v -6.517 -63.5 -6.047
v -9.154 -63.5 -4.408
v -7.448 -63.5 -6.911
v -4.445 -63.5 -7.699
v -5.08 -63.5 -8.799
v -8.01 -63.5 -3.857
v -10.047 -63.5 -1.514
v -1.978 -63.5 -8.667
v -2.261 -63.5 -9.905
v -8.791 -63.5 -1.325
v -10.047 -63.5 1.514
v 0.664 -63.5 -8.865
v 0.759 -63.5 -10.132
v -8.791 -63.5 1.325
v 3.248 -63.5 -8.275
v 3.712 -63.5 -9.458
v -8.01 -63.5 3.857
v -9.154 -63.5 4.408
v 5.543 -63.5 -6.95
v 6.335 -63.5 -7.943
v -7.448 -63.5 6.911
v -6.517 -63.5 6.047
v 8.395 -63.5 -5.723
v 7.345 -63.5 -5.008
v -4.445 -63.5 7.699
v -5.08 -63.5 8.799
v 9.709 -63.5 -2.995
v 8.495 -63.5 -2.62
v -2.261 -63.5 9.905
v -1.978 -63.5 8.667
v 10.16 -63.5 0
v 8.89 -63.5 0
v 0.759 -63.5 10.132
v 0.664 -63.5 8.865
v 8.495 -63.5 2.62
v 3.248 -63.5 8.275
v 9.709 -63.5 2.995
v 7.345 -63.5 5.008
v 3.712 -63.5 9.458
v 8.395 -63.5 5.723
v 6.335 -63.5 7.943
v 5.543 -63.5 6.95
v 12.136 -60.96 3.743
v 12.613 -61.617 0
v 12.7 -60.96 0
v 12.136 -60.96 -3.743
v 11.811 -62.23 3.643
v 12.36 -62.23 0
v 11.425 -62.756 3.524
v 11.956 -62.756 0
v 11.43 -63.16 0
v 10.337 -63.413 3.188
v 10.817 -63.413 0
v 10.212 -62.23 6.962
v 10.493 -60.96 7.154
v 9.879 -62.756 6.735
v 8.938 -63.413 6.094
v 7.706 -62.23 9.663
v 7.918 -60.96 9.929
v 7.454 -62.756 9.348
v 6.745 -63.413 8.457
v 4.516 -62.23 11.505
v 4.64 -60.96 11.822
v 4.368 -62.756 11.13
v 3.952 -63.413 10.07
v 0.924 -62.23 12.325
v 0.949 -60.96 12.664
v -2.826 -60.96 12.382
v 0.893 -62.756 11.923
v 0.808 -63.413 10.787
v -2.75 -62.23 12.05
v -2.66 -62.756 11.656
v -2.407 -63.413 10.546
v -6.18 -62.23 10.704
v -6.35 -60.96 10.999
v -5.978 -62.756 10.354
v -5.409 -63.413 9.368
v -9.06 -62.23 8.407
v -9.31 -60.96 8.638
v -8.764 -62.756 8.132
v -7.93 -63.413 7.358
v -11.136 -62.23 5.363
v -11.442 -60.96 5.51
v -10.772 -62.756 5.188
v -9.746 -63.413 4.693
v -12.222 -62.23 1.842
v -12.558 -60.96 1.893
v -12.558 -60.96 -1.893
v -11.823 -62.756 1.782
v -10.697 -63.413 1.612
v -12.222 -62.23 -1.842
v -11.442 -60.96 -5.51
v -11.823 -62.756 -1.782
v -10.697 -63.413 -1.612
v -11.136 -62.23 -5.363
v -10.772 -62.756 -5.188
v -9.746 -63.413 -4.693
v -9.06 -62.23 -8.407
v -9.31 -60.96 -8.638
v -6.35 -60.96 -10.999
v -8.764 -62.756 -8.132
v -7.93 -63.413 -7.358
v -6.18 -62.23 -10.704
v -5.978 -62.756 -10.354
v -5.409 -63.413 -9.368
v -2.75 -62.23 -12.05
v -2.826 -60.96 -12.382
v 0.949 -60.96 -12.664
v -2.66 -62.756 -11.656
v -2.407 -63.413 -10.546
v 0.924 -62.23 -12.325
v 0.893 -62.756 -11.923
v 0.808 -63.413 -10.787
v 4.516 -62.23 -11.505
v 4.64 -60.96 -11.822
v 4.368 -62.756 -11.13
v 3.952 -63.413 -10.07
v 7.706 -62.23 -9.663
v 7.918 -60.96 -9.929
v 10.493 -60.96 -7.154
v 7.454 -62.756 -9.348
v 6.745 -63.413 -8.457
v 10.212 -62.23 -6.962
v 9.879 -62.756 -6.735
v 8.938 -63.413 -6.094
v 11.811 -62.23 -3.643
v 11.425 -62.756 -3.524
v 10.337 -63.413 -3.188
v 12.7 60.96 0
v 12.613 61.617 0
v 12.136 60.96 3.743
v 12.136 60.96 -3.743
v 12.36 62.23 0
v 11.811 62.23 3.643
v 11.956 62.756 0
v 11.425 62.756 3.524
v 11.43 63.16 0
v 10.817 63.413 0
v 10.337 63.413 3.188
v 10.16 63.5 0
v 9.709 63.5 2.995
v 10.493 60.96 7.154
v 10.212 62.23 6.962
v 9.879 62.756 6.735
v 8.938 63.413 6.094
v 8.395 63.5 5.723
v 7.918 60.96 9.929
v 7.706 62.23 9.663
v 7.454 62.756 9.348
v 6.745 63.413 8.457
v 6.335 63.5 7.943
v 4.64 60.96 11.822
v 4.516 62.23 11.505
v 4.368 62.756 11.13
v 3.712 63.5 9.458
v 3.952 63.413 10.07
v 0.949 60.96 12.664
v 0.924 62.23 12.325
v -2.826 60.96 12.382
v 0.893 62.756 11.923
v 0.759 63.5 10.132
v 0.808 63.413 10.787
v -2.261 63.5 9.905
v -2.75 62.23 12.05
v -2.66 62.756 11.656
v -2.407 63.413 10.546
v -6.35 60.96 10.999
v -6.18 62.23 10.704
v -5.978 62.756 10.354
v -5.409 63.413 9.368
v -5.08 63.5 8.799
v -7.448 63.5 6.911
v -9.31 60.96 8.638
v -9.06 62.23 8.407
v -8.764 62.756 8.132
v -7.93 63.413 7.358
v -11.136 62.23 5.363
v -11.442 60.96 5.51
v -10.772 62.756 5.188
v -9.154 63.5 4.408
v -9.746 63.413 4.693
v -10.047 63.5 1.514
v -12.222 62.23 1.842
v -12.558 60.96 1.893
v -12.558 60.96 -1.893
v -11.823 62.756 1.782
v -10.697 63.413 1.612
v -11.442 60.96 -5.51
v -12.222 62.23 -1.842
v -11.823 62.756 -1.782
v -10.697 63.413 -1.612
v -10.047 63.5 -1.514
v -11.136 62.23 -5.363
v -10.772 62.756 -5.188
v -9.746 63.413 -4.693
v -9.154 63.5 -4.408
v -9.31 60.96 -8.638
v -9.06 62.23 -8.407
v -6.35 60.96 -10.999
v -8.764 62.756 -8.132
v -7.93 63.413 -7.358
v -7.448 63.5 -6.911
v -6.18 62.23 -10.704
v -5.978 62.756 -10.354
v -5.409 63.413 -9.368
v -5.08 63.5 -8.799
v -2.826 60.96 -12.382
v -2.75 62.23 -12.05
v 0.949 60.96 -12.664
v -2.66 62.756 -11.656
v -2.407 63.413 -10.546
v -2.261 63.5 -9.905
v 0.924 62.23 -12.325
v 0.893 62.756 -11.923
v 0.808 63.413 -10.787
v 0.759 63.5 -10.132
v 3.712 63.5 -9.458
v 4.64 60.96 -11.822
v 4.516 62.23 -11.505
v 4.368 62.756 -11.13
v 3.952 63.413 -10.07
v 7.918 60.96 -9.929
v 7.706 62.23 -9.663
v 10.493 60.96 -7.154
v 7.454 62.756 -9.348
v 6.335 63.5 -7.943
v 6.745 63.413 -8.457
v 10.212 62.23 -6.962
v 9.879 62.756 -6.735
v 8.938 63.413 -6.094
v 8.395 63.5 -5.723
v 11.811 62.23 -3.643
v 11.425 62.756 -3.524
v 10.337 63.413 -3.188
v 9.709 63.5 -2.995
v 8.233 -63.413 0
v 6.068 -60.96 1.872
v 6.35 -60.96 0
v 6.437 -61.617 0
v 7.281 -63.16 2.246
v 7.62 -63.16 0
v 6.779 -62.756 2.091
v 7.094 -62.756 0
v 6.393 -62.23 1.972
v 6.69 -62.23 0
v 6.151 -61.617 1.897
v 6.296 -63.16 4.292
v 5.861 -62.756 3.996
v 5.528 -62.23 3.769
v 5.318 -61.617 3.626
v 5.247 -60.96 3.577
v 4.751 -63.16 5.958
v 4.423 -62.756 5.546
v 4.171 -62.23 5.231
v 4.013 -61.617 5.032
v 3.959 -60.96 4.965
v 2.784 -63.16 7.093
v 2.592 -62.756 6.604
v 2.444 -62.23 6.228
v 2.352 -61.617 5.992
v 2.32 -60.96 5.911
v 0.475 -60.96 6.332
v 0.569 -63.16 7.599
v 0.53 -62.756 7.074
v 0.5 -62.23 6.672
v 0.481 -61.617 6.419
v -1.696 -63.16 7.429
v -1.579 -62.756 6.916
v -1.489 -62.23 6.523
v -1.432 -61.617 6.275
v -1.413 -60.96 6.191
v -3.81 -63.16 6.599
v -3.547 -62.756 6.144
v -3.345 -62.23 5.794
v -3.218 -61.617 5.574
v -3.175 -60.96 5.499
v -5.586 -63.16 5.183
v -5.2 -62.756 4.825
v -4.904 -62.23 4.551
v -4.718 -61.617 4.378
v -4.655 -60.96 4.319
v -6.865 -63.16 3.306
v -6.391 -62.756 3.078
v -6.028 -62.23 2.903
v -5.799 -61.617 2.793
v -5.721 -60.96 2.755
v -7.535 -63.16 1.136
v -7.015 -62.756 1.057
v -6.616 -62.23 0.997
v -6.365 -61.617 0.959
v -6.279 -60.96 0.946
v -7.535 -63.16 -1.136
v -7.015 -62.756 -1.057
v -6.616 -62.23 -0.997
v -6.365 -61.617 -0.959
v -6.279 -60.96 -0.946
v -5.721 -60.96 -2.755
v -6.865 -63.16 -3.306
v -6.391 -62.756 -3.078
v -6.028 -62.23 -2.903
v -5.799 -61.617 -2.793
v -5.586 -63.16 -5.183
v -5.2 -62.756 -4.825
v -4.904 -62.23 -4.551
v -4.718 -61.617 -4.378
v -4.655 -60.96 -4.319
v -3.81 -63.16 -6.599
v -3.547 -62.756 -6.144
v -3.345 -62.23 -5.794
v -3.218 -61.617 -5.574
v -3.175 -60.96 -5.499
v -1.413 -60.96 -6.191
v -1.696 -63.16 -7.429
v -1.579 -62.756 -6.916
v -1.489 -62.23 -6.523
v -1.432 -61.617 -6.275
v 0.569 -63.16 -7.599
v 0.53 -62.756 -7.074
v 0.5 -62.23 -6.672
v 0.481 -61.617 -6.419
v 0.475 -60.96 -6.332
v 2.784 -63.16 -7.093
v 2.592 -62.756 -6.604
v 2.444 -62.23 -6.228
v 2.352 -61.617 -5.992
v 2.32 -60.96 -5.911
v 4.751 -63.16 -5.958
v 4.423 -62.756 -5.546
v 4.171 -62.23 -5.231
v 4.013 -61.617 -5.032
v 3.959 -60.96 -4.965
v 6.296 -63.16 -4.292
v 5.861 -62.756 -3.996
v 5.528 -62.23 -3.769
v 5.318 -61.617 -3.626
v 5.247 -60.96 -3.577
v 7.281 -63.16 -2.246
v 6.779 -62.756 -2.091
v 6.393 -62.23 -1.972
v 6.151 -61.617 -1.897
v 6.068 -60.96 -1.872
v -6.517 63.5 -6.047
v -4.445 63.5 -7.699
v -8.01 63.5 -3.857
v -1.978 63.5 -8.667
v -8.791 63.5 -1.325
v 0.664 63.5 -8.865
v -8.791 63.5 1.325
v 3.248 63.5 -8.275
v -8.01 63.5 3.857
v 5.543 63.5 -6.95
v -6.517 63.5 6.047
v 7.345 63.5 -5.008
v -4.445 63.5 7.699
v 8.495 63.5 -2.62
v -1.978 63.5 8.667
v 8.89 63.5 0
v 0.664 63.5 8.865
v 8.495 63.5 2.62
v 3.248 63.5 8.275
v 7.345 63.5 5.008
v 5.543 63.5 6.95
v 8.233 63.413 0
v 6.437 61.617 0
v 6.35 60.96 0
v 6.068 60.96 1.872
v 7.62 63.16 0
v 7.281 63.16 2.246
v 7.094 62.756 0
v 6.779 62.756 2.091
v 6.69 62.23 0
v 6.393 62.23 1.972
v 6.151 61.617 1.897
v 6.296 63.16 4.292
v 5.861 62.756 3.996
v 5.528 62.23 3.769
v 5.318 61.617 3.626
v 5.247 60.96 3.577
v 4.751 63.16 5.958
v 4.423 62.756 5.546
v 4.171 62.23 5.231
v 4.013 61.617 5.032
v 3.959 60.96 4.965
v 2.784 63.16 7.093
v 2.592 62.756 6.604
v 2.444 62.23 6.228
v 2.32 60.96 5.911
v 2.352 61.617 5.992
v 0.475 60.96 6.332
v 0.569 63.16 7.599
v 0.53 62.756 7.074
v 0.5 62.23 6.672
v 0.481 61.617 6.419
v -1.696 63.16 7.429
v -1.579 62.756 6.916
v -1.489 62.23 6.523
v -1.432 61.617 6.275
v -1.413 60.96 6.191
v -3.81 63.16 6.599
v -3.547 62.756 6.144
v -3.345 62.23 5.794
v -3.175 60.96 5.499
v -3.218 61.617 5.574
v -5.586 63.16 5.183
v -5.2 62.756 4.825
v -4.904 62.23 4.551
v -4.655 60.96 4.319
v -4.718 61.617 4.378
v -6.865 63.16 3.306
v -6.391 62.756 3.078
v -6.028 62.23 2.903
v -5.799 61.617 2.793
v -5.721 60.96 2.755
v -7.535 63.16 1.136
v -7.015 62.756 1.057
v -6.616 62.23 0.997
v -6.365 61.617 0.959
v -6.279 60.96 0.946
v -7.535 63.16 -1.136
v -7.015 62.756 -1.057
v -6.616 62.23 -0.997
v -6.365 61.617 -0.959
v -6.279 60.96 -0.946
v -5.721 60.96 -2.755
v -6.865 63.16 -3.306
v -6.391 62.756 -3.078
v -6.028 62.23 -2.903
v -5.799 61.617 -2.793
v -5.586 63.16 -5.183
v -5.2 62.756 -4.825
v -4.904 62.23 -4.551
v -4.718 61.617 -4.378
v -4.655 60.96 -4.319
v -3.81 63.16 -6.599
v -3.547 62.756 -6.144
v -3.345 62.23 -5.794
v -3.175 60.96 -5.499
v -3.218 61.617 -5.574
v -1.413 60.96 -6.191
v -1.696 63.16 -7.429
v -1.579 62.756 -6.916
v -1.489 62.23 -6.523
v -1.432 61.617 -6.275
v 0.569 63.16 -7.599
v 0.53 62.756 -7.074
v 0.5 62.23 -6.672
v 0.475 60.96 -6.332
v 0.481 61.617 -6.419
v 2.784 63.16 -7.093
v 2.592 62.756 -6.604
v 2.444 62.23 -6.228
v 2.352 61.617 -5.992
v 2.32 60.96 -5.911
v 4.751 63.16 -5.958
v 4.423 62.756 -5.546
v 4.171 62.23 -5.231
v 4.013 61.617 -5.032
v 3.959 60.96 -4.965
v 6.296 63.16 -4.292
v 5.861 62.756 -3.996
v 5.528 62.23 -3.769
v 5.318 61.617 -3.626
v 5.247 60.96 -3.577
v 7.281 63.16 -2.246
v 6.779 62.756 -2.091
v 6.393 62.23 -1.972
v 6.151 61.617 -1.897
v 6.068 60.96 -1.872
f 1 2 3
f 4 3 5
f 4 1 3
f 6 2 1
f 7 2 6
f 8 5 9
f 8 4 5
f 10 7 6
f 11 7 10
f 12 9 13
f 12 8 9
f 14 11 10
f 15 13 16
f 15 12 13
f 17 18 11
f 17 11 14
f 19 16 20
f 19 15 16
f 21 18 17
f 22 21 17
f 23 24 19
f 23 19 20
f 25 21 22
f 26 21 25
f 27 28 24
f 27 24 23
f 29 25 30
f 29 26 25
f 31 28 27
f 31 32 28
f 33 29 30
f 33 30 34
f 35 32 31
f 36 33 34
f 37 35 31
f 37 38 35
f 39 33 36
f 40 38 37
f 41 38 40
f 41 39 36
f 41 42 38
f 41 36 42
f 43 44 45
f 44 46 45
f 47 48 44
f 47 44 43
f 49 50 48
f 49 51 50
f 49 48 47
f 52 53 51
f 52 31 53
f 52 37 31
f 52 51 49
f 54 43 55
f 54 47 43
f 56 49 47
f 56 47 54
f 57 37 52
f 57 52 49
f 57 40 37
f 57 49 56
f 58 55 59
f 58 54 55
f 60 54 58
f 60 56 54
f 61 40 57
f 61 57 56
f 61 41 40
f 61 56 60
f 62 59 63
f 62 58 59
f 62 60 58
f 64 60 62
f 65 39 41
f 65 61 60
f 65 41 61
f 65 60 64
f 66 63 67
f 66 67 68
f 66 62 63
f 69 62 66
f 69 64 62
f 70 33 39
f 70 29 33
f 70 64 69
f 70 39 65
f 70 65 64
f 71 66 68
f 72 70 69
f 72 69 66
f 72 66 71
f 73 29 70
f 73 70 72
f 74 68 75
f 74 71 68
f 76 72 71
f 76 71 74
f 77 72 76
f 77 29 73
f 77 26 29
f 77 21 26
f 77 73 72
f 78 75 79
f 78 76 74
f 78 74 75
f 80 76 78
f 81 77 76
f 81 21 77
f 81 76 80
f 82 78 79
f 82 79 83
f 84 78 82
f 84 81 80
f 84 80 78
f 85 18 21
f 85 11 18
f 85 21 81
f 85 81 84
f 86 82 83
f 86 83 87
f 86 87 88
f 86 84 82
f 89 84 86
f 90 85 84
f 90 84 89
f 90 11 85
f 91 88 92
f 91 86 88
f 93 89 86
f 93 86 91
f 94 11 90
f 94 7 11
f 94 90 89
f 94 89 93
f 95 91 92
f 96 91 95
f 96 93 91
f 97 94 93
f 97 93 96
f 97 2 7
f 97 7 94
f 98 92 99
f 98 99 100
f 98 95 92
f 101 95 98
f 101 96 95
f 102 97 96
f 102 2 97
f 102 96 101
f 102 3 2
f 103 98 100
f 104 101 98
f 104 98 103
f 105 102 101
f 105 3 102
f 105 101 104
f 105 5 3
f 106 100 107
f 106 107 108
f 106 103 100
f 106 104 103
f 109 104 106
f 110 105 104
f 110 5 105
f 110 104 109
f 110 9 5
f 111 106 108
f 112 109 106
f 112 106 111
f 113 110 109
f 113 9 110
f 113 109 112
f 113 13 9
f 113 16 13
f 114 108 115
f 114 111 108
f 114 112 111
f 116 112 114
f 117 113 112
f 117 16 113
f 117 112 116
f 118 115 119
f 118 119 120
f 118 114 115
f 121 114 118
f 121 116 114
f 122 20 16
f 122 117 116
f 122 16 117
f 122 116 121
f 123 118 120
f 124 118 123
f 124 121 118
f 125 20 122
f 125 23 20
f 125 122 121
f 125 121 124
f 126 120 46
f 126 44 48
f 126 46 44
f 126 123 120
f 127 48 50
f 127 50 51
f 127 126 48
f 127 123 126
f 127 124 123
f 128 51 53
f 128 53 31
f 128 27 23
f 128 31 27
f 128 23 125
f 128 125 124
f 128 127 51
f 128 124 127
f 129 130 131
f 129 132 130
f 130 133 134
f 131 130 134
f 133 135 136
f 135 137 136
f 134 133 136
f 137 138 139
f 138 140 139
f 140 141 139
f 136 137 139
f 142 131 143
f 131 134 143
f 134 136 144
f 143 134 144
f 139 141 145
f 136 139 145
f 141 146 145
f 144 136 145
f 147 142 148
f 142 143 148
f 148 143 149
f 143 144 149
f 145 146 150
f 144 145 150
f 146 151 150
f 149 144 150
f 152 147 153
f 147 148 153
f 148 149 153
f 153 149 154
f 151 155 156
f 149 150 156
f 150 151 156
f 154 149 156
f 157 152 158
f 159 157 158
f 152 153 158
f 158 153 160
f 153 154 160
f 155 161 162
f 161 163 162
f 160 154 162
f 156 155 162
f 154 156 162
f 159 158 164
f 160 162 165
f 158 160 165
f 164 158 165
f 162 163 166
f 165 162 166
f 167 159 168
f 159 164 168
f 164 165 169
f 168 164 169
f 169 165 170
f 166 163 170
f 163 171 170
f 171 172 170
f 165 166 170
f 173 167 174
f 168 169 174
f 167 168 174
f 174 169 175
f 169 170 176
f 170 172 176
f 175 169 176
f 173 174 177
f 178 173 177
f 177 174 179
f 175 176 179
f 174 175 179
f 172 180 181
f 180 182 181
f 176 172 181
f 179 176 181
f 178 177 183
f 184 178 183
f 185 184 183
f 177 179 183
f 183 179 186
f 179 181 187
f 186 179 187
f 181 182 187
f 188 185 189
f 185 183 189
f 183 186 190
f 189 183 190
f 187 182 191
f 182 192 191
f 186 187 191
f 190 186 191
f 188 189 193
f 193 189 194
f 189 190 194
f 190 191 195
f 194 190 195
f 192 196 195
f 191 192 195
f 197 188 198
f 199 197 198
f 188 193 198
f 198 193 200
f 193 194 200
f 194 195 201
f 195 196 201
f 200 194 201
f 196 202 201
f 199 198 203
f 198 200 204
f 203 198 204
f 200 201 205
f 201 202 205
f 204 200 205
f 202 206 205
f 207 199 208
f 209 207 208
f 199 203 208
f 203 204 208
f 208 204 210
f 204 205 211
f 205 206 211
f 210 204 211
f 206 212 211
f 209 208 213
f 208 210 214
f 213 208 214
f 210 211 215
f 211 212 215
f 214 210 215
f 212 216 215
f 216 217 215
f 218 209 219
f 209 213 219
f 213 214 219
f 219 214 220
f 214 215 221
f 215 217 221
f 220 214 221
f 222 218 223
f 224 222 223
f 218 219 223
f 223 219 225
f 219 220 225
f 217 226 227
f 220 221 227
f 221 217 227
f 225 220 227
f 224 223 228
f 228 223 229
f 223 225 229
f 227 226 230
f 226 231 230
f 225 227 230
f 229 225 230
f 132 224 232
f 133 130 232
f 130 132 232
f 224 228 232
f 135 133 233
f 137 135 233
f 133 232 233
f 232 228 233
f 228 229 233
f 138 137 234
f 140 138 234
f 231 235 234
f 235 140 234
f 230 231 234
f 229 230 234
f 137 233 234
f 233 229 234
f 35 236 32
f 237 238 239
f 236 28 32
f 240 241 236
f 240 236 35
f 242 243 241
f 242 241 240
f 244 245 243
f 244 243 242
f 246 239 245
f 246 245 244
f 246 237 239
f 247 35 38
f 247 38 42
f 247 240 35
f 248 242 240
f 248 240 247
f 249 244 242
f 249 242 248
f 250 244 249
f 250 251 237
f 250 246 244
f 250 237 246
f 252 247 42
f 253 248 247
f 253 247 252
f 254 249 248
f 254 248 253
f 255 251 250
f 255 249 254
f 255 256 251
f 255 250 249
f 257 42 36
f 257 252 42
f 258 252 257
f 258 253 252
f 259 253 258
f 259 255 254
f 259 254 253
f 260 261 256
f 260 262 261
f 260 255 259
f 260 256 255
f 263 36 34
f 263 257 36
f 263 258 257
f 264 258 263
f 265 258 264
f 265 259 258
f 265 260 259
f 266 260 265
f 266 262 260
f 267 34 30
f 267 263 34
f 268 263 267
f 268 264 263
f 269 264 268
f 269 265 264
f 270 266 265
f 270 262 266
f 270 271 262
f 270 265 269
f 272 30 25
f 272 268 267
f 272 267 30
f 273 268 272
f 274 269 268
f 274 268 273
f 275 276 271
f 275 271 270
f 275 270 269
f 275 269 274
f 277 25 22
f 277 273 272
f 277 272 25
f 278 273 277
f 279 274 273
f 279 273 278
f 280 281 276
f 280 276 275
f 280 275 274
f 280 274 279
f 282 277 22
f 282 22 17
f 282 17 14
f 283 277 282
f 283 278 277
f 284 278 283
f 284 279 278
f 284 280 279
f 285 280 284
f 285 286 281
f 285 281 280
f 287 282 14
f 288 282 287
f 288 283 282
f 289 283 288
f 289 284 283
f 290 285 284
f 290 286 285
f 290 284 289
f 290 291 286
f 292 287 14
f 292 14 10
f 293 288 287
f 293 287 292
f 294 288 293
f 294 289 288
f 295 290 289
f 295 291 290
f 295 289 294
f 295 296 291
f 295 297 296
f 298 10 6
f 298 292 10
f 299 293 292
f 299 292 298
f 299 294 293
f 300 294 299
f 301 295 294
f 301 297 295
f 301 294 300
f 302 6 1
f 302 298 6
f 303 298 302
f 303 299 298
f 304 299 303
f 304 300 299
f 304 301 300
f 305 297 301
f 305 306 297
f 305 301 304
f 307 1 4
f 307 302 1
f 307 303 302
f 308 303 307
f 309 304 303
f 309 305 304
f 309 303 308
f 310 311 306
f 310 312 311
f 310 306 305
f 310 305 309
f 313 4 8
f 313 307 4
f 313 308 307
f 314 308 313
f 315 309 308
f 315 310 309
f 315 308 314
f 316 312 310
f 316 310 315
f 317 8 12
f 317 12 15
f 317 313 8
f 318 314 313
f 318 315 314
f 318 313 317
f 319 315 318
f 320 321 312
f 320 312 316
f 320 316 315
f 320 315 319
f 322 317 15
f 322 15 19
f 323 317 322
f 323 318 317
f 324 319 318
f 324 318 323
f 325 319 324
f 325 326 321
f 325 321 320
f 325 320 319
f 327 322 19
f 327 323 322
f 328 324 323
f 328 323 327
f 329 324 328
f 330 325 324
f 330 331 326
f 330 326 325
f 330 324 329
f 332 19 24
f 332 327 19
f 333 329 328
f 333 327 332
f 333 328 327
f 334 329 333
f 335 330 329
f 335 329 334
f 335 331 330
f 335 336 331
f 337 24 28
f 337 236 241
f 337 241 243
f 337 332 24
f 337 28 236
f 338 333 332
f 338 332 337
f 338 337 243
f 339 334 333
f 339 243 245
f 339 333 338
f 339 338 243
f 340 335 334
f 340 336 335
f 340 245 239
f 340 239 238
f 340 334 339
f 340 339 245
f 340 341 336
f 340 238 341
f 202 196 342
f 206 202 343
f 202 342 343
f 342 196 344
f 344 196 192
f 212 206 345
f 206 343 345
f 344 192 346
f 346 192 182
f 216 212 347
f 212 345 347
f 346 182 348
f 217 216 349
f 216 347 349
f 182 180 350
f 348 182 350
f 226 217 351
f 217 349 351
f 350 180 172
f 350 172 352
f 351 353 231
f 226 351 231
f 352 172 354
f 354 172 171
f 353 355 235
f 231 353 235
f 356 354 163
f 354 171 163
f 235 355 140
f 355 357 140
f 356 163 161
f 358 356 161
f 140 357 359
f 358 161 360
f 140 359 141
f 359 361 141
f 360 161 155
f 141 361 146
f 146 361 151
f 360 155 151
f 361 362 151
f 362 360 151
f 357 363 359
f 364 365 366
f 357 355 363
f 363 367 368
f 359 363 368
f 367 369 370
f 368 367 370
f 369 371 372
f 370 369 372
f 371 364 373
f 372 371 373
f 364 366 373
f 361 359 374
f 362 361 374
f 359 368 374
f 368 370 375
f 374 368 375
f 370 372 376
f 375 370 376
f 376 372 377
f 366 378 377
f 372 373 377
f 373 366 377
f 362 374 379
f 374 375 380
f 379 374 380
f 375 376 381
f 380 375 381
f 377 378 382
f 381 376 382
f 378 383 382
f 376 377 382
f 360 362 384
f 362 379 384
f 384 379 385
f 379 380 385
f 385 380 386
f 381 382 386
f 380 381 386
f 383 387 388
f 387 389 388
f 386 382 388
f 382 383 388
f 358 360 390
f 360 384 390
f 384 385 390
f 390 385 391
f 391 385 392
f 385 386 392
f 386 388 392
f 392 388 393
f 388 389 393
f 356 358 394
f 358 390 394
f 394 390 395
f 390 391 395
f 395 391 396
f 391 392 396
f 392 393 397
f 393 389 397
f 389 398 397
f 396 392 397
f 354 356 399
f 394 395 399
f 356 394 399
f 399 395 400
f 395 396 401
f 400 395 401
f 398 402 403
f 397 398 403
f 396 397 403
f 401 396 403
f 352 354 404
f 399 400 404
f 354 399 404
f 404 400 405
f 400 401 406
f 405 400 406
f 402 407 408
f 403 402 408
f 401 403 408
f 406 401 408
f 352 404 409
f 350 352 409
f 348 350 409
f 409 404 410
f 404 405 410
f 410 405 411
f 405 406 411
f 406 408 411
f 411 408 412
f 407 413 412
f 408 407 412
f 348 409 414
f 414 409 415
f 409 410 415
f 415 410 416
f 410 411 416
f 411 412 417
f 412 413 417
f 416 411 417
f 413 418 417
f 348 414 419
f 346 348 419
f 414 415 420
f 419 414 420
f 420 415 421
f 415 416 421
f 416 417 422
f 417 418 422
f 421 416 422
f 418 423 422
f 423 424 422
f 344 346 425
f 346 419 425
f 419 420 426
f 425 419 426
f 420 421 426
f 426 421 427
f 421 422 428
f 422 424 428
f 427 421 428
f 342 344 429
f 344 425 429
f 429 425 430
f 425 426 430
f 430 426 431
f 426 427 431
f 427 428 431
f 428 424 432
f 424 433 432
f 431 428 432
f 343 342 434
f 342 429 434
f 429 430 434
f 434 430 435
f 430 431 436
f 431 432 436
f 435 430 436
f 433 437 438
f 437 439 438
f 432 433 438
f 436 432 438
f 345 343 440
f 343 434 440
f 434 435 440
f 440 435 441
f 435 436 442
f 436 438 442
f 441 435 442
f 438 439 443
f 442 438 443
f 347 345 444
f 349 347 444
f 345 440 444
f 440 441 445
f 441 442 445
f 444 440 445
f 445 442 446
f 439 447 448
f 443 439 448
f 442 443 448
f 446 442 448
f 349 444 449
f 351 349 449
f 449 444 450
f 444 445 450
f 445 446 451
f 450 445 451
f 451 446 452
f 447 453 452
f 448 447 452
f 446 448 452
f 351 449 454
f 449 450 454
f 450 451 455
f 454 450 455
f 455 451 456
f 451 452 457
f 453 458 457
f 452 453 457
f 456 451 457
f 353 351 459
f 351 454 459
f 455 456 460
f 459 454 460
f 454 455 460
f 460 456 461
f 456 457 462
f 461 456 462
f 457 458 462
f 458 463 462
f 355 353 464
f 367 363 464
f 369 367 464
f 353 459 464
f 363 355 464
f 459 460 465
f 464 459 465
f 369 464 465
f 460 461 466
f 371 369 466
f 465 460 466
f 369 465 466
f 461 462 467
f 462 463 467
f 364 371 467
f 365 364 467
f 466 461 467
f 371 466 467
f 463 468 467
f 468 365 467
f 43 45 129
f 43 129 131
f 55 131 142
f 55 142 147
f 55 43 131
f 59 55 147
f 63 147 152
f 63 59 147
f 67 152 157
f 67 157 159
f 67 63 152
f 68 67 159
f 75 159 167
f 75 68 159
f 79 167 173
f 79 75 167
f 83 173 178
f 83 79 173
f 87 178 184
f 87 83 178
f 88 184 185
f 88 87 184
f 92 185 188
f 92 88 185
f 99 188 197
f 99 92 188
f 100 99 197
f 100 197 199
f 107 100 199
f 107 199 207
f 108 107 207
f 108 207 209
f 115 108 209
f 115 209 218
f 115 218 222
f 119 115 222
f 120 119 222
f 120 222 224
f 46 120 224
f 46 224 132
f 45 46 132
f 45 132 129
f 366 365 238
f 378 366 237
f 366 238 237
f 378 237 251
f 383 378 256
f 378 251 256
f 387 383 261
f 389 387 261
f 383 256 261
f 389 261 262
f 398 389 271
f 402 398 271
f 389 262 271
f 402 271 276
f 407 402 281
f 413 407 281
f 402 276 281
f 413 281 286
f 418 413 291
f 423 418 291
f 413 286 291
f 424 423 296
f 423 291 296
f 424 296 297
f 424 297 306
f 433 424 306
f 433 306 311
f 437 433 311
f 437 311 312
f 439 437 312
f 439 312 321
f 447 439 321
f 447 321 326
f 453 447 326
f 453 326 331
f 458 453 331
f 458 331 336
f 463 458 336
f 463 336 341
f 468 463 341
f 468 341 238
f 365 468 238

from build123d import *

# Parameters (mm, degrees)
F0_R     = 12.7
F1_DEPTH = 63.5
F3_D     = 12.7
F4_R     = 2.54


with BuildPart() as f1:
    # F0 (on Front) → F1 (new body, symmetric)
    with BuildSketch(Plane.XZ):
        Circle(F0_R)
    extrude(amount=F1_DEPTH, both=True)

    # F3 (through all)
    with Locations(Plane(origin=(0, 63.5, 0), x_dir=(-1, 0, 0), z_dir=(0, 1, 0))):
        with Locations((0, 0)):
            Hole(F3_D / 2)

    # F4
    f4_edges = [f1.edges().sort_by_distance(p)[0] for p in [
        (-12.7, -63.5, 0),
        (-12.7, 63.5, 0),
        (6.35, 63.5, 0),
        (6.35, -63.5, 0),
    ]]
    fillet(f4_edges, radius=F4_R)


solid = f1.part
